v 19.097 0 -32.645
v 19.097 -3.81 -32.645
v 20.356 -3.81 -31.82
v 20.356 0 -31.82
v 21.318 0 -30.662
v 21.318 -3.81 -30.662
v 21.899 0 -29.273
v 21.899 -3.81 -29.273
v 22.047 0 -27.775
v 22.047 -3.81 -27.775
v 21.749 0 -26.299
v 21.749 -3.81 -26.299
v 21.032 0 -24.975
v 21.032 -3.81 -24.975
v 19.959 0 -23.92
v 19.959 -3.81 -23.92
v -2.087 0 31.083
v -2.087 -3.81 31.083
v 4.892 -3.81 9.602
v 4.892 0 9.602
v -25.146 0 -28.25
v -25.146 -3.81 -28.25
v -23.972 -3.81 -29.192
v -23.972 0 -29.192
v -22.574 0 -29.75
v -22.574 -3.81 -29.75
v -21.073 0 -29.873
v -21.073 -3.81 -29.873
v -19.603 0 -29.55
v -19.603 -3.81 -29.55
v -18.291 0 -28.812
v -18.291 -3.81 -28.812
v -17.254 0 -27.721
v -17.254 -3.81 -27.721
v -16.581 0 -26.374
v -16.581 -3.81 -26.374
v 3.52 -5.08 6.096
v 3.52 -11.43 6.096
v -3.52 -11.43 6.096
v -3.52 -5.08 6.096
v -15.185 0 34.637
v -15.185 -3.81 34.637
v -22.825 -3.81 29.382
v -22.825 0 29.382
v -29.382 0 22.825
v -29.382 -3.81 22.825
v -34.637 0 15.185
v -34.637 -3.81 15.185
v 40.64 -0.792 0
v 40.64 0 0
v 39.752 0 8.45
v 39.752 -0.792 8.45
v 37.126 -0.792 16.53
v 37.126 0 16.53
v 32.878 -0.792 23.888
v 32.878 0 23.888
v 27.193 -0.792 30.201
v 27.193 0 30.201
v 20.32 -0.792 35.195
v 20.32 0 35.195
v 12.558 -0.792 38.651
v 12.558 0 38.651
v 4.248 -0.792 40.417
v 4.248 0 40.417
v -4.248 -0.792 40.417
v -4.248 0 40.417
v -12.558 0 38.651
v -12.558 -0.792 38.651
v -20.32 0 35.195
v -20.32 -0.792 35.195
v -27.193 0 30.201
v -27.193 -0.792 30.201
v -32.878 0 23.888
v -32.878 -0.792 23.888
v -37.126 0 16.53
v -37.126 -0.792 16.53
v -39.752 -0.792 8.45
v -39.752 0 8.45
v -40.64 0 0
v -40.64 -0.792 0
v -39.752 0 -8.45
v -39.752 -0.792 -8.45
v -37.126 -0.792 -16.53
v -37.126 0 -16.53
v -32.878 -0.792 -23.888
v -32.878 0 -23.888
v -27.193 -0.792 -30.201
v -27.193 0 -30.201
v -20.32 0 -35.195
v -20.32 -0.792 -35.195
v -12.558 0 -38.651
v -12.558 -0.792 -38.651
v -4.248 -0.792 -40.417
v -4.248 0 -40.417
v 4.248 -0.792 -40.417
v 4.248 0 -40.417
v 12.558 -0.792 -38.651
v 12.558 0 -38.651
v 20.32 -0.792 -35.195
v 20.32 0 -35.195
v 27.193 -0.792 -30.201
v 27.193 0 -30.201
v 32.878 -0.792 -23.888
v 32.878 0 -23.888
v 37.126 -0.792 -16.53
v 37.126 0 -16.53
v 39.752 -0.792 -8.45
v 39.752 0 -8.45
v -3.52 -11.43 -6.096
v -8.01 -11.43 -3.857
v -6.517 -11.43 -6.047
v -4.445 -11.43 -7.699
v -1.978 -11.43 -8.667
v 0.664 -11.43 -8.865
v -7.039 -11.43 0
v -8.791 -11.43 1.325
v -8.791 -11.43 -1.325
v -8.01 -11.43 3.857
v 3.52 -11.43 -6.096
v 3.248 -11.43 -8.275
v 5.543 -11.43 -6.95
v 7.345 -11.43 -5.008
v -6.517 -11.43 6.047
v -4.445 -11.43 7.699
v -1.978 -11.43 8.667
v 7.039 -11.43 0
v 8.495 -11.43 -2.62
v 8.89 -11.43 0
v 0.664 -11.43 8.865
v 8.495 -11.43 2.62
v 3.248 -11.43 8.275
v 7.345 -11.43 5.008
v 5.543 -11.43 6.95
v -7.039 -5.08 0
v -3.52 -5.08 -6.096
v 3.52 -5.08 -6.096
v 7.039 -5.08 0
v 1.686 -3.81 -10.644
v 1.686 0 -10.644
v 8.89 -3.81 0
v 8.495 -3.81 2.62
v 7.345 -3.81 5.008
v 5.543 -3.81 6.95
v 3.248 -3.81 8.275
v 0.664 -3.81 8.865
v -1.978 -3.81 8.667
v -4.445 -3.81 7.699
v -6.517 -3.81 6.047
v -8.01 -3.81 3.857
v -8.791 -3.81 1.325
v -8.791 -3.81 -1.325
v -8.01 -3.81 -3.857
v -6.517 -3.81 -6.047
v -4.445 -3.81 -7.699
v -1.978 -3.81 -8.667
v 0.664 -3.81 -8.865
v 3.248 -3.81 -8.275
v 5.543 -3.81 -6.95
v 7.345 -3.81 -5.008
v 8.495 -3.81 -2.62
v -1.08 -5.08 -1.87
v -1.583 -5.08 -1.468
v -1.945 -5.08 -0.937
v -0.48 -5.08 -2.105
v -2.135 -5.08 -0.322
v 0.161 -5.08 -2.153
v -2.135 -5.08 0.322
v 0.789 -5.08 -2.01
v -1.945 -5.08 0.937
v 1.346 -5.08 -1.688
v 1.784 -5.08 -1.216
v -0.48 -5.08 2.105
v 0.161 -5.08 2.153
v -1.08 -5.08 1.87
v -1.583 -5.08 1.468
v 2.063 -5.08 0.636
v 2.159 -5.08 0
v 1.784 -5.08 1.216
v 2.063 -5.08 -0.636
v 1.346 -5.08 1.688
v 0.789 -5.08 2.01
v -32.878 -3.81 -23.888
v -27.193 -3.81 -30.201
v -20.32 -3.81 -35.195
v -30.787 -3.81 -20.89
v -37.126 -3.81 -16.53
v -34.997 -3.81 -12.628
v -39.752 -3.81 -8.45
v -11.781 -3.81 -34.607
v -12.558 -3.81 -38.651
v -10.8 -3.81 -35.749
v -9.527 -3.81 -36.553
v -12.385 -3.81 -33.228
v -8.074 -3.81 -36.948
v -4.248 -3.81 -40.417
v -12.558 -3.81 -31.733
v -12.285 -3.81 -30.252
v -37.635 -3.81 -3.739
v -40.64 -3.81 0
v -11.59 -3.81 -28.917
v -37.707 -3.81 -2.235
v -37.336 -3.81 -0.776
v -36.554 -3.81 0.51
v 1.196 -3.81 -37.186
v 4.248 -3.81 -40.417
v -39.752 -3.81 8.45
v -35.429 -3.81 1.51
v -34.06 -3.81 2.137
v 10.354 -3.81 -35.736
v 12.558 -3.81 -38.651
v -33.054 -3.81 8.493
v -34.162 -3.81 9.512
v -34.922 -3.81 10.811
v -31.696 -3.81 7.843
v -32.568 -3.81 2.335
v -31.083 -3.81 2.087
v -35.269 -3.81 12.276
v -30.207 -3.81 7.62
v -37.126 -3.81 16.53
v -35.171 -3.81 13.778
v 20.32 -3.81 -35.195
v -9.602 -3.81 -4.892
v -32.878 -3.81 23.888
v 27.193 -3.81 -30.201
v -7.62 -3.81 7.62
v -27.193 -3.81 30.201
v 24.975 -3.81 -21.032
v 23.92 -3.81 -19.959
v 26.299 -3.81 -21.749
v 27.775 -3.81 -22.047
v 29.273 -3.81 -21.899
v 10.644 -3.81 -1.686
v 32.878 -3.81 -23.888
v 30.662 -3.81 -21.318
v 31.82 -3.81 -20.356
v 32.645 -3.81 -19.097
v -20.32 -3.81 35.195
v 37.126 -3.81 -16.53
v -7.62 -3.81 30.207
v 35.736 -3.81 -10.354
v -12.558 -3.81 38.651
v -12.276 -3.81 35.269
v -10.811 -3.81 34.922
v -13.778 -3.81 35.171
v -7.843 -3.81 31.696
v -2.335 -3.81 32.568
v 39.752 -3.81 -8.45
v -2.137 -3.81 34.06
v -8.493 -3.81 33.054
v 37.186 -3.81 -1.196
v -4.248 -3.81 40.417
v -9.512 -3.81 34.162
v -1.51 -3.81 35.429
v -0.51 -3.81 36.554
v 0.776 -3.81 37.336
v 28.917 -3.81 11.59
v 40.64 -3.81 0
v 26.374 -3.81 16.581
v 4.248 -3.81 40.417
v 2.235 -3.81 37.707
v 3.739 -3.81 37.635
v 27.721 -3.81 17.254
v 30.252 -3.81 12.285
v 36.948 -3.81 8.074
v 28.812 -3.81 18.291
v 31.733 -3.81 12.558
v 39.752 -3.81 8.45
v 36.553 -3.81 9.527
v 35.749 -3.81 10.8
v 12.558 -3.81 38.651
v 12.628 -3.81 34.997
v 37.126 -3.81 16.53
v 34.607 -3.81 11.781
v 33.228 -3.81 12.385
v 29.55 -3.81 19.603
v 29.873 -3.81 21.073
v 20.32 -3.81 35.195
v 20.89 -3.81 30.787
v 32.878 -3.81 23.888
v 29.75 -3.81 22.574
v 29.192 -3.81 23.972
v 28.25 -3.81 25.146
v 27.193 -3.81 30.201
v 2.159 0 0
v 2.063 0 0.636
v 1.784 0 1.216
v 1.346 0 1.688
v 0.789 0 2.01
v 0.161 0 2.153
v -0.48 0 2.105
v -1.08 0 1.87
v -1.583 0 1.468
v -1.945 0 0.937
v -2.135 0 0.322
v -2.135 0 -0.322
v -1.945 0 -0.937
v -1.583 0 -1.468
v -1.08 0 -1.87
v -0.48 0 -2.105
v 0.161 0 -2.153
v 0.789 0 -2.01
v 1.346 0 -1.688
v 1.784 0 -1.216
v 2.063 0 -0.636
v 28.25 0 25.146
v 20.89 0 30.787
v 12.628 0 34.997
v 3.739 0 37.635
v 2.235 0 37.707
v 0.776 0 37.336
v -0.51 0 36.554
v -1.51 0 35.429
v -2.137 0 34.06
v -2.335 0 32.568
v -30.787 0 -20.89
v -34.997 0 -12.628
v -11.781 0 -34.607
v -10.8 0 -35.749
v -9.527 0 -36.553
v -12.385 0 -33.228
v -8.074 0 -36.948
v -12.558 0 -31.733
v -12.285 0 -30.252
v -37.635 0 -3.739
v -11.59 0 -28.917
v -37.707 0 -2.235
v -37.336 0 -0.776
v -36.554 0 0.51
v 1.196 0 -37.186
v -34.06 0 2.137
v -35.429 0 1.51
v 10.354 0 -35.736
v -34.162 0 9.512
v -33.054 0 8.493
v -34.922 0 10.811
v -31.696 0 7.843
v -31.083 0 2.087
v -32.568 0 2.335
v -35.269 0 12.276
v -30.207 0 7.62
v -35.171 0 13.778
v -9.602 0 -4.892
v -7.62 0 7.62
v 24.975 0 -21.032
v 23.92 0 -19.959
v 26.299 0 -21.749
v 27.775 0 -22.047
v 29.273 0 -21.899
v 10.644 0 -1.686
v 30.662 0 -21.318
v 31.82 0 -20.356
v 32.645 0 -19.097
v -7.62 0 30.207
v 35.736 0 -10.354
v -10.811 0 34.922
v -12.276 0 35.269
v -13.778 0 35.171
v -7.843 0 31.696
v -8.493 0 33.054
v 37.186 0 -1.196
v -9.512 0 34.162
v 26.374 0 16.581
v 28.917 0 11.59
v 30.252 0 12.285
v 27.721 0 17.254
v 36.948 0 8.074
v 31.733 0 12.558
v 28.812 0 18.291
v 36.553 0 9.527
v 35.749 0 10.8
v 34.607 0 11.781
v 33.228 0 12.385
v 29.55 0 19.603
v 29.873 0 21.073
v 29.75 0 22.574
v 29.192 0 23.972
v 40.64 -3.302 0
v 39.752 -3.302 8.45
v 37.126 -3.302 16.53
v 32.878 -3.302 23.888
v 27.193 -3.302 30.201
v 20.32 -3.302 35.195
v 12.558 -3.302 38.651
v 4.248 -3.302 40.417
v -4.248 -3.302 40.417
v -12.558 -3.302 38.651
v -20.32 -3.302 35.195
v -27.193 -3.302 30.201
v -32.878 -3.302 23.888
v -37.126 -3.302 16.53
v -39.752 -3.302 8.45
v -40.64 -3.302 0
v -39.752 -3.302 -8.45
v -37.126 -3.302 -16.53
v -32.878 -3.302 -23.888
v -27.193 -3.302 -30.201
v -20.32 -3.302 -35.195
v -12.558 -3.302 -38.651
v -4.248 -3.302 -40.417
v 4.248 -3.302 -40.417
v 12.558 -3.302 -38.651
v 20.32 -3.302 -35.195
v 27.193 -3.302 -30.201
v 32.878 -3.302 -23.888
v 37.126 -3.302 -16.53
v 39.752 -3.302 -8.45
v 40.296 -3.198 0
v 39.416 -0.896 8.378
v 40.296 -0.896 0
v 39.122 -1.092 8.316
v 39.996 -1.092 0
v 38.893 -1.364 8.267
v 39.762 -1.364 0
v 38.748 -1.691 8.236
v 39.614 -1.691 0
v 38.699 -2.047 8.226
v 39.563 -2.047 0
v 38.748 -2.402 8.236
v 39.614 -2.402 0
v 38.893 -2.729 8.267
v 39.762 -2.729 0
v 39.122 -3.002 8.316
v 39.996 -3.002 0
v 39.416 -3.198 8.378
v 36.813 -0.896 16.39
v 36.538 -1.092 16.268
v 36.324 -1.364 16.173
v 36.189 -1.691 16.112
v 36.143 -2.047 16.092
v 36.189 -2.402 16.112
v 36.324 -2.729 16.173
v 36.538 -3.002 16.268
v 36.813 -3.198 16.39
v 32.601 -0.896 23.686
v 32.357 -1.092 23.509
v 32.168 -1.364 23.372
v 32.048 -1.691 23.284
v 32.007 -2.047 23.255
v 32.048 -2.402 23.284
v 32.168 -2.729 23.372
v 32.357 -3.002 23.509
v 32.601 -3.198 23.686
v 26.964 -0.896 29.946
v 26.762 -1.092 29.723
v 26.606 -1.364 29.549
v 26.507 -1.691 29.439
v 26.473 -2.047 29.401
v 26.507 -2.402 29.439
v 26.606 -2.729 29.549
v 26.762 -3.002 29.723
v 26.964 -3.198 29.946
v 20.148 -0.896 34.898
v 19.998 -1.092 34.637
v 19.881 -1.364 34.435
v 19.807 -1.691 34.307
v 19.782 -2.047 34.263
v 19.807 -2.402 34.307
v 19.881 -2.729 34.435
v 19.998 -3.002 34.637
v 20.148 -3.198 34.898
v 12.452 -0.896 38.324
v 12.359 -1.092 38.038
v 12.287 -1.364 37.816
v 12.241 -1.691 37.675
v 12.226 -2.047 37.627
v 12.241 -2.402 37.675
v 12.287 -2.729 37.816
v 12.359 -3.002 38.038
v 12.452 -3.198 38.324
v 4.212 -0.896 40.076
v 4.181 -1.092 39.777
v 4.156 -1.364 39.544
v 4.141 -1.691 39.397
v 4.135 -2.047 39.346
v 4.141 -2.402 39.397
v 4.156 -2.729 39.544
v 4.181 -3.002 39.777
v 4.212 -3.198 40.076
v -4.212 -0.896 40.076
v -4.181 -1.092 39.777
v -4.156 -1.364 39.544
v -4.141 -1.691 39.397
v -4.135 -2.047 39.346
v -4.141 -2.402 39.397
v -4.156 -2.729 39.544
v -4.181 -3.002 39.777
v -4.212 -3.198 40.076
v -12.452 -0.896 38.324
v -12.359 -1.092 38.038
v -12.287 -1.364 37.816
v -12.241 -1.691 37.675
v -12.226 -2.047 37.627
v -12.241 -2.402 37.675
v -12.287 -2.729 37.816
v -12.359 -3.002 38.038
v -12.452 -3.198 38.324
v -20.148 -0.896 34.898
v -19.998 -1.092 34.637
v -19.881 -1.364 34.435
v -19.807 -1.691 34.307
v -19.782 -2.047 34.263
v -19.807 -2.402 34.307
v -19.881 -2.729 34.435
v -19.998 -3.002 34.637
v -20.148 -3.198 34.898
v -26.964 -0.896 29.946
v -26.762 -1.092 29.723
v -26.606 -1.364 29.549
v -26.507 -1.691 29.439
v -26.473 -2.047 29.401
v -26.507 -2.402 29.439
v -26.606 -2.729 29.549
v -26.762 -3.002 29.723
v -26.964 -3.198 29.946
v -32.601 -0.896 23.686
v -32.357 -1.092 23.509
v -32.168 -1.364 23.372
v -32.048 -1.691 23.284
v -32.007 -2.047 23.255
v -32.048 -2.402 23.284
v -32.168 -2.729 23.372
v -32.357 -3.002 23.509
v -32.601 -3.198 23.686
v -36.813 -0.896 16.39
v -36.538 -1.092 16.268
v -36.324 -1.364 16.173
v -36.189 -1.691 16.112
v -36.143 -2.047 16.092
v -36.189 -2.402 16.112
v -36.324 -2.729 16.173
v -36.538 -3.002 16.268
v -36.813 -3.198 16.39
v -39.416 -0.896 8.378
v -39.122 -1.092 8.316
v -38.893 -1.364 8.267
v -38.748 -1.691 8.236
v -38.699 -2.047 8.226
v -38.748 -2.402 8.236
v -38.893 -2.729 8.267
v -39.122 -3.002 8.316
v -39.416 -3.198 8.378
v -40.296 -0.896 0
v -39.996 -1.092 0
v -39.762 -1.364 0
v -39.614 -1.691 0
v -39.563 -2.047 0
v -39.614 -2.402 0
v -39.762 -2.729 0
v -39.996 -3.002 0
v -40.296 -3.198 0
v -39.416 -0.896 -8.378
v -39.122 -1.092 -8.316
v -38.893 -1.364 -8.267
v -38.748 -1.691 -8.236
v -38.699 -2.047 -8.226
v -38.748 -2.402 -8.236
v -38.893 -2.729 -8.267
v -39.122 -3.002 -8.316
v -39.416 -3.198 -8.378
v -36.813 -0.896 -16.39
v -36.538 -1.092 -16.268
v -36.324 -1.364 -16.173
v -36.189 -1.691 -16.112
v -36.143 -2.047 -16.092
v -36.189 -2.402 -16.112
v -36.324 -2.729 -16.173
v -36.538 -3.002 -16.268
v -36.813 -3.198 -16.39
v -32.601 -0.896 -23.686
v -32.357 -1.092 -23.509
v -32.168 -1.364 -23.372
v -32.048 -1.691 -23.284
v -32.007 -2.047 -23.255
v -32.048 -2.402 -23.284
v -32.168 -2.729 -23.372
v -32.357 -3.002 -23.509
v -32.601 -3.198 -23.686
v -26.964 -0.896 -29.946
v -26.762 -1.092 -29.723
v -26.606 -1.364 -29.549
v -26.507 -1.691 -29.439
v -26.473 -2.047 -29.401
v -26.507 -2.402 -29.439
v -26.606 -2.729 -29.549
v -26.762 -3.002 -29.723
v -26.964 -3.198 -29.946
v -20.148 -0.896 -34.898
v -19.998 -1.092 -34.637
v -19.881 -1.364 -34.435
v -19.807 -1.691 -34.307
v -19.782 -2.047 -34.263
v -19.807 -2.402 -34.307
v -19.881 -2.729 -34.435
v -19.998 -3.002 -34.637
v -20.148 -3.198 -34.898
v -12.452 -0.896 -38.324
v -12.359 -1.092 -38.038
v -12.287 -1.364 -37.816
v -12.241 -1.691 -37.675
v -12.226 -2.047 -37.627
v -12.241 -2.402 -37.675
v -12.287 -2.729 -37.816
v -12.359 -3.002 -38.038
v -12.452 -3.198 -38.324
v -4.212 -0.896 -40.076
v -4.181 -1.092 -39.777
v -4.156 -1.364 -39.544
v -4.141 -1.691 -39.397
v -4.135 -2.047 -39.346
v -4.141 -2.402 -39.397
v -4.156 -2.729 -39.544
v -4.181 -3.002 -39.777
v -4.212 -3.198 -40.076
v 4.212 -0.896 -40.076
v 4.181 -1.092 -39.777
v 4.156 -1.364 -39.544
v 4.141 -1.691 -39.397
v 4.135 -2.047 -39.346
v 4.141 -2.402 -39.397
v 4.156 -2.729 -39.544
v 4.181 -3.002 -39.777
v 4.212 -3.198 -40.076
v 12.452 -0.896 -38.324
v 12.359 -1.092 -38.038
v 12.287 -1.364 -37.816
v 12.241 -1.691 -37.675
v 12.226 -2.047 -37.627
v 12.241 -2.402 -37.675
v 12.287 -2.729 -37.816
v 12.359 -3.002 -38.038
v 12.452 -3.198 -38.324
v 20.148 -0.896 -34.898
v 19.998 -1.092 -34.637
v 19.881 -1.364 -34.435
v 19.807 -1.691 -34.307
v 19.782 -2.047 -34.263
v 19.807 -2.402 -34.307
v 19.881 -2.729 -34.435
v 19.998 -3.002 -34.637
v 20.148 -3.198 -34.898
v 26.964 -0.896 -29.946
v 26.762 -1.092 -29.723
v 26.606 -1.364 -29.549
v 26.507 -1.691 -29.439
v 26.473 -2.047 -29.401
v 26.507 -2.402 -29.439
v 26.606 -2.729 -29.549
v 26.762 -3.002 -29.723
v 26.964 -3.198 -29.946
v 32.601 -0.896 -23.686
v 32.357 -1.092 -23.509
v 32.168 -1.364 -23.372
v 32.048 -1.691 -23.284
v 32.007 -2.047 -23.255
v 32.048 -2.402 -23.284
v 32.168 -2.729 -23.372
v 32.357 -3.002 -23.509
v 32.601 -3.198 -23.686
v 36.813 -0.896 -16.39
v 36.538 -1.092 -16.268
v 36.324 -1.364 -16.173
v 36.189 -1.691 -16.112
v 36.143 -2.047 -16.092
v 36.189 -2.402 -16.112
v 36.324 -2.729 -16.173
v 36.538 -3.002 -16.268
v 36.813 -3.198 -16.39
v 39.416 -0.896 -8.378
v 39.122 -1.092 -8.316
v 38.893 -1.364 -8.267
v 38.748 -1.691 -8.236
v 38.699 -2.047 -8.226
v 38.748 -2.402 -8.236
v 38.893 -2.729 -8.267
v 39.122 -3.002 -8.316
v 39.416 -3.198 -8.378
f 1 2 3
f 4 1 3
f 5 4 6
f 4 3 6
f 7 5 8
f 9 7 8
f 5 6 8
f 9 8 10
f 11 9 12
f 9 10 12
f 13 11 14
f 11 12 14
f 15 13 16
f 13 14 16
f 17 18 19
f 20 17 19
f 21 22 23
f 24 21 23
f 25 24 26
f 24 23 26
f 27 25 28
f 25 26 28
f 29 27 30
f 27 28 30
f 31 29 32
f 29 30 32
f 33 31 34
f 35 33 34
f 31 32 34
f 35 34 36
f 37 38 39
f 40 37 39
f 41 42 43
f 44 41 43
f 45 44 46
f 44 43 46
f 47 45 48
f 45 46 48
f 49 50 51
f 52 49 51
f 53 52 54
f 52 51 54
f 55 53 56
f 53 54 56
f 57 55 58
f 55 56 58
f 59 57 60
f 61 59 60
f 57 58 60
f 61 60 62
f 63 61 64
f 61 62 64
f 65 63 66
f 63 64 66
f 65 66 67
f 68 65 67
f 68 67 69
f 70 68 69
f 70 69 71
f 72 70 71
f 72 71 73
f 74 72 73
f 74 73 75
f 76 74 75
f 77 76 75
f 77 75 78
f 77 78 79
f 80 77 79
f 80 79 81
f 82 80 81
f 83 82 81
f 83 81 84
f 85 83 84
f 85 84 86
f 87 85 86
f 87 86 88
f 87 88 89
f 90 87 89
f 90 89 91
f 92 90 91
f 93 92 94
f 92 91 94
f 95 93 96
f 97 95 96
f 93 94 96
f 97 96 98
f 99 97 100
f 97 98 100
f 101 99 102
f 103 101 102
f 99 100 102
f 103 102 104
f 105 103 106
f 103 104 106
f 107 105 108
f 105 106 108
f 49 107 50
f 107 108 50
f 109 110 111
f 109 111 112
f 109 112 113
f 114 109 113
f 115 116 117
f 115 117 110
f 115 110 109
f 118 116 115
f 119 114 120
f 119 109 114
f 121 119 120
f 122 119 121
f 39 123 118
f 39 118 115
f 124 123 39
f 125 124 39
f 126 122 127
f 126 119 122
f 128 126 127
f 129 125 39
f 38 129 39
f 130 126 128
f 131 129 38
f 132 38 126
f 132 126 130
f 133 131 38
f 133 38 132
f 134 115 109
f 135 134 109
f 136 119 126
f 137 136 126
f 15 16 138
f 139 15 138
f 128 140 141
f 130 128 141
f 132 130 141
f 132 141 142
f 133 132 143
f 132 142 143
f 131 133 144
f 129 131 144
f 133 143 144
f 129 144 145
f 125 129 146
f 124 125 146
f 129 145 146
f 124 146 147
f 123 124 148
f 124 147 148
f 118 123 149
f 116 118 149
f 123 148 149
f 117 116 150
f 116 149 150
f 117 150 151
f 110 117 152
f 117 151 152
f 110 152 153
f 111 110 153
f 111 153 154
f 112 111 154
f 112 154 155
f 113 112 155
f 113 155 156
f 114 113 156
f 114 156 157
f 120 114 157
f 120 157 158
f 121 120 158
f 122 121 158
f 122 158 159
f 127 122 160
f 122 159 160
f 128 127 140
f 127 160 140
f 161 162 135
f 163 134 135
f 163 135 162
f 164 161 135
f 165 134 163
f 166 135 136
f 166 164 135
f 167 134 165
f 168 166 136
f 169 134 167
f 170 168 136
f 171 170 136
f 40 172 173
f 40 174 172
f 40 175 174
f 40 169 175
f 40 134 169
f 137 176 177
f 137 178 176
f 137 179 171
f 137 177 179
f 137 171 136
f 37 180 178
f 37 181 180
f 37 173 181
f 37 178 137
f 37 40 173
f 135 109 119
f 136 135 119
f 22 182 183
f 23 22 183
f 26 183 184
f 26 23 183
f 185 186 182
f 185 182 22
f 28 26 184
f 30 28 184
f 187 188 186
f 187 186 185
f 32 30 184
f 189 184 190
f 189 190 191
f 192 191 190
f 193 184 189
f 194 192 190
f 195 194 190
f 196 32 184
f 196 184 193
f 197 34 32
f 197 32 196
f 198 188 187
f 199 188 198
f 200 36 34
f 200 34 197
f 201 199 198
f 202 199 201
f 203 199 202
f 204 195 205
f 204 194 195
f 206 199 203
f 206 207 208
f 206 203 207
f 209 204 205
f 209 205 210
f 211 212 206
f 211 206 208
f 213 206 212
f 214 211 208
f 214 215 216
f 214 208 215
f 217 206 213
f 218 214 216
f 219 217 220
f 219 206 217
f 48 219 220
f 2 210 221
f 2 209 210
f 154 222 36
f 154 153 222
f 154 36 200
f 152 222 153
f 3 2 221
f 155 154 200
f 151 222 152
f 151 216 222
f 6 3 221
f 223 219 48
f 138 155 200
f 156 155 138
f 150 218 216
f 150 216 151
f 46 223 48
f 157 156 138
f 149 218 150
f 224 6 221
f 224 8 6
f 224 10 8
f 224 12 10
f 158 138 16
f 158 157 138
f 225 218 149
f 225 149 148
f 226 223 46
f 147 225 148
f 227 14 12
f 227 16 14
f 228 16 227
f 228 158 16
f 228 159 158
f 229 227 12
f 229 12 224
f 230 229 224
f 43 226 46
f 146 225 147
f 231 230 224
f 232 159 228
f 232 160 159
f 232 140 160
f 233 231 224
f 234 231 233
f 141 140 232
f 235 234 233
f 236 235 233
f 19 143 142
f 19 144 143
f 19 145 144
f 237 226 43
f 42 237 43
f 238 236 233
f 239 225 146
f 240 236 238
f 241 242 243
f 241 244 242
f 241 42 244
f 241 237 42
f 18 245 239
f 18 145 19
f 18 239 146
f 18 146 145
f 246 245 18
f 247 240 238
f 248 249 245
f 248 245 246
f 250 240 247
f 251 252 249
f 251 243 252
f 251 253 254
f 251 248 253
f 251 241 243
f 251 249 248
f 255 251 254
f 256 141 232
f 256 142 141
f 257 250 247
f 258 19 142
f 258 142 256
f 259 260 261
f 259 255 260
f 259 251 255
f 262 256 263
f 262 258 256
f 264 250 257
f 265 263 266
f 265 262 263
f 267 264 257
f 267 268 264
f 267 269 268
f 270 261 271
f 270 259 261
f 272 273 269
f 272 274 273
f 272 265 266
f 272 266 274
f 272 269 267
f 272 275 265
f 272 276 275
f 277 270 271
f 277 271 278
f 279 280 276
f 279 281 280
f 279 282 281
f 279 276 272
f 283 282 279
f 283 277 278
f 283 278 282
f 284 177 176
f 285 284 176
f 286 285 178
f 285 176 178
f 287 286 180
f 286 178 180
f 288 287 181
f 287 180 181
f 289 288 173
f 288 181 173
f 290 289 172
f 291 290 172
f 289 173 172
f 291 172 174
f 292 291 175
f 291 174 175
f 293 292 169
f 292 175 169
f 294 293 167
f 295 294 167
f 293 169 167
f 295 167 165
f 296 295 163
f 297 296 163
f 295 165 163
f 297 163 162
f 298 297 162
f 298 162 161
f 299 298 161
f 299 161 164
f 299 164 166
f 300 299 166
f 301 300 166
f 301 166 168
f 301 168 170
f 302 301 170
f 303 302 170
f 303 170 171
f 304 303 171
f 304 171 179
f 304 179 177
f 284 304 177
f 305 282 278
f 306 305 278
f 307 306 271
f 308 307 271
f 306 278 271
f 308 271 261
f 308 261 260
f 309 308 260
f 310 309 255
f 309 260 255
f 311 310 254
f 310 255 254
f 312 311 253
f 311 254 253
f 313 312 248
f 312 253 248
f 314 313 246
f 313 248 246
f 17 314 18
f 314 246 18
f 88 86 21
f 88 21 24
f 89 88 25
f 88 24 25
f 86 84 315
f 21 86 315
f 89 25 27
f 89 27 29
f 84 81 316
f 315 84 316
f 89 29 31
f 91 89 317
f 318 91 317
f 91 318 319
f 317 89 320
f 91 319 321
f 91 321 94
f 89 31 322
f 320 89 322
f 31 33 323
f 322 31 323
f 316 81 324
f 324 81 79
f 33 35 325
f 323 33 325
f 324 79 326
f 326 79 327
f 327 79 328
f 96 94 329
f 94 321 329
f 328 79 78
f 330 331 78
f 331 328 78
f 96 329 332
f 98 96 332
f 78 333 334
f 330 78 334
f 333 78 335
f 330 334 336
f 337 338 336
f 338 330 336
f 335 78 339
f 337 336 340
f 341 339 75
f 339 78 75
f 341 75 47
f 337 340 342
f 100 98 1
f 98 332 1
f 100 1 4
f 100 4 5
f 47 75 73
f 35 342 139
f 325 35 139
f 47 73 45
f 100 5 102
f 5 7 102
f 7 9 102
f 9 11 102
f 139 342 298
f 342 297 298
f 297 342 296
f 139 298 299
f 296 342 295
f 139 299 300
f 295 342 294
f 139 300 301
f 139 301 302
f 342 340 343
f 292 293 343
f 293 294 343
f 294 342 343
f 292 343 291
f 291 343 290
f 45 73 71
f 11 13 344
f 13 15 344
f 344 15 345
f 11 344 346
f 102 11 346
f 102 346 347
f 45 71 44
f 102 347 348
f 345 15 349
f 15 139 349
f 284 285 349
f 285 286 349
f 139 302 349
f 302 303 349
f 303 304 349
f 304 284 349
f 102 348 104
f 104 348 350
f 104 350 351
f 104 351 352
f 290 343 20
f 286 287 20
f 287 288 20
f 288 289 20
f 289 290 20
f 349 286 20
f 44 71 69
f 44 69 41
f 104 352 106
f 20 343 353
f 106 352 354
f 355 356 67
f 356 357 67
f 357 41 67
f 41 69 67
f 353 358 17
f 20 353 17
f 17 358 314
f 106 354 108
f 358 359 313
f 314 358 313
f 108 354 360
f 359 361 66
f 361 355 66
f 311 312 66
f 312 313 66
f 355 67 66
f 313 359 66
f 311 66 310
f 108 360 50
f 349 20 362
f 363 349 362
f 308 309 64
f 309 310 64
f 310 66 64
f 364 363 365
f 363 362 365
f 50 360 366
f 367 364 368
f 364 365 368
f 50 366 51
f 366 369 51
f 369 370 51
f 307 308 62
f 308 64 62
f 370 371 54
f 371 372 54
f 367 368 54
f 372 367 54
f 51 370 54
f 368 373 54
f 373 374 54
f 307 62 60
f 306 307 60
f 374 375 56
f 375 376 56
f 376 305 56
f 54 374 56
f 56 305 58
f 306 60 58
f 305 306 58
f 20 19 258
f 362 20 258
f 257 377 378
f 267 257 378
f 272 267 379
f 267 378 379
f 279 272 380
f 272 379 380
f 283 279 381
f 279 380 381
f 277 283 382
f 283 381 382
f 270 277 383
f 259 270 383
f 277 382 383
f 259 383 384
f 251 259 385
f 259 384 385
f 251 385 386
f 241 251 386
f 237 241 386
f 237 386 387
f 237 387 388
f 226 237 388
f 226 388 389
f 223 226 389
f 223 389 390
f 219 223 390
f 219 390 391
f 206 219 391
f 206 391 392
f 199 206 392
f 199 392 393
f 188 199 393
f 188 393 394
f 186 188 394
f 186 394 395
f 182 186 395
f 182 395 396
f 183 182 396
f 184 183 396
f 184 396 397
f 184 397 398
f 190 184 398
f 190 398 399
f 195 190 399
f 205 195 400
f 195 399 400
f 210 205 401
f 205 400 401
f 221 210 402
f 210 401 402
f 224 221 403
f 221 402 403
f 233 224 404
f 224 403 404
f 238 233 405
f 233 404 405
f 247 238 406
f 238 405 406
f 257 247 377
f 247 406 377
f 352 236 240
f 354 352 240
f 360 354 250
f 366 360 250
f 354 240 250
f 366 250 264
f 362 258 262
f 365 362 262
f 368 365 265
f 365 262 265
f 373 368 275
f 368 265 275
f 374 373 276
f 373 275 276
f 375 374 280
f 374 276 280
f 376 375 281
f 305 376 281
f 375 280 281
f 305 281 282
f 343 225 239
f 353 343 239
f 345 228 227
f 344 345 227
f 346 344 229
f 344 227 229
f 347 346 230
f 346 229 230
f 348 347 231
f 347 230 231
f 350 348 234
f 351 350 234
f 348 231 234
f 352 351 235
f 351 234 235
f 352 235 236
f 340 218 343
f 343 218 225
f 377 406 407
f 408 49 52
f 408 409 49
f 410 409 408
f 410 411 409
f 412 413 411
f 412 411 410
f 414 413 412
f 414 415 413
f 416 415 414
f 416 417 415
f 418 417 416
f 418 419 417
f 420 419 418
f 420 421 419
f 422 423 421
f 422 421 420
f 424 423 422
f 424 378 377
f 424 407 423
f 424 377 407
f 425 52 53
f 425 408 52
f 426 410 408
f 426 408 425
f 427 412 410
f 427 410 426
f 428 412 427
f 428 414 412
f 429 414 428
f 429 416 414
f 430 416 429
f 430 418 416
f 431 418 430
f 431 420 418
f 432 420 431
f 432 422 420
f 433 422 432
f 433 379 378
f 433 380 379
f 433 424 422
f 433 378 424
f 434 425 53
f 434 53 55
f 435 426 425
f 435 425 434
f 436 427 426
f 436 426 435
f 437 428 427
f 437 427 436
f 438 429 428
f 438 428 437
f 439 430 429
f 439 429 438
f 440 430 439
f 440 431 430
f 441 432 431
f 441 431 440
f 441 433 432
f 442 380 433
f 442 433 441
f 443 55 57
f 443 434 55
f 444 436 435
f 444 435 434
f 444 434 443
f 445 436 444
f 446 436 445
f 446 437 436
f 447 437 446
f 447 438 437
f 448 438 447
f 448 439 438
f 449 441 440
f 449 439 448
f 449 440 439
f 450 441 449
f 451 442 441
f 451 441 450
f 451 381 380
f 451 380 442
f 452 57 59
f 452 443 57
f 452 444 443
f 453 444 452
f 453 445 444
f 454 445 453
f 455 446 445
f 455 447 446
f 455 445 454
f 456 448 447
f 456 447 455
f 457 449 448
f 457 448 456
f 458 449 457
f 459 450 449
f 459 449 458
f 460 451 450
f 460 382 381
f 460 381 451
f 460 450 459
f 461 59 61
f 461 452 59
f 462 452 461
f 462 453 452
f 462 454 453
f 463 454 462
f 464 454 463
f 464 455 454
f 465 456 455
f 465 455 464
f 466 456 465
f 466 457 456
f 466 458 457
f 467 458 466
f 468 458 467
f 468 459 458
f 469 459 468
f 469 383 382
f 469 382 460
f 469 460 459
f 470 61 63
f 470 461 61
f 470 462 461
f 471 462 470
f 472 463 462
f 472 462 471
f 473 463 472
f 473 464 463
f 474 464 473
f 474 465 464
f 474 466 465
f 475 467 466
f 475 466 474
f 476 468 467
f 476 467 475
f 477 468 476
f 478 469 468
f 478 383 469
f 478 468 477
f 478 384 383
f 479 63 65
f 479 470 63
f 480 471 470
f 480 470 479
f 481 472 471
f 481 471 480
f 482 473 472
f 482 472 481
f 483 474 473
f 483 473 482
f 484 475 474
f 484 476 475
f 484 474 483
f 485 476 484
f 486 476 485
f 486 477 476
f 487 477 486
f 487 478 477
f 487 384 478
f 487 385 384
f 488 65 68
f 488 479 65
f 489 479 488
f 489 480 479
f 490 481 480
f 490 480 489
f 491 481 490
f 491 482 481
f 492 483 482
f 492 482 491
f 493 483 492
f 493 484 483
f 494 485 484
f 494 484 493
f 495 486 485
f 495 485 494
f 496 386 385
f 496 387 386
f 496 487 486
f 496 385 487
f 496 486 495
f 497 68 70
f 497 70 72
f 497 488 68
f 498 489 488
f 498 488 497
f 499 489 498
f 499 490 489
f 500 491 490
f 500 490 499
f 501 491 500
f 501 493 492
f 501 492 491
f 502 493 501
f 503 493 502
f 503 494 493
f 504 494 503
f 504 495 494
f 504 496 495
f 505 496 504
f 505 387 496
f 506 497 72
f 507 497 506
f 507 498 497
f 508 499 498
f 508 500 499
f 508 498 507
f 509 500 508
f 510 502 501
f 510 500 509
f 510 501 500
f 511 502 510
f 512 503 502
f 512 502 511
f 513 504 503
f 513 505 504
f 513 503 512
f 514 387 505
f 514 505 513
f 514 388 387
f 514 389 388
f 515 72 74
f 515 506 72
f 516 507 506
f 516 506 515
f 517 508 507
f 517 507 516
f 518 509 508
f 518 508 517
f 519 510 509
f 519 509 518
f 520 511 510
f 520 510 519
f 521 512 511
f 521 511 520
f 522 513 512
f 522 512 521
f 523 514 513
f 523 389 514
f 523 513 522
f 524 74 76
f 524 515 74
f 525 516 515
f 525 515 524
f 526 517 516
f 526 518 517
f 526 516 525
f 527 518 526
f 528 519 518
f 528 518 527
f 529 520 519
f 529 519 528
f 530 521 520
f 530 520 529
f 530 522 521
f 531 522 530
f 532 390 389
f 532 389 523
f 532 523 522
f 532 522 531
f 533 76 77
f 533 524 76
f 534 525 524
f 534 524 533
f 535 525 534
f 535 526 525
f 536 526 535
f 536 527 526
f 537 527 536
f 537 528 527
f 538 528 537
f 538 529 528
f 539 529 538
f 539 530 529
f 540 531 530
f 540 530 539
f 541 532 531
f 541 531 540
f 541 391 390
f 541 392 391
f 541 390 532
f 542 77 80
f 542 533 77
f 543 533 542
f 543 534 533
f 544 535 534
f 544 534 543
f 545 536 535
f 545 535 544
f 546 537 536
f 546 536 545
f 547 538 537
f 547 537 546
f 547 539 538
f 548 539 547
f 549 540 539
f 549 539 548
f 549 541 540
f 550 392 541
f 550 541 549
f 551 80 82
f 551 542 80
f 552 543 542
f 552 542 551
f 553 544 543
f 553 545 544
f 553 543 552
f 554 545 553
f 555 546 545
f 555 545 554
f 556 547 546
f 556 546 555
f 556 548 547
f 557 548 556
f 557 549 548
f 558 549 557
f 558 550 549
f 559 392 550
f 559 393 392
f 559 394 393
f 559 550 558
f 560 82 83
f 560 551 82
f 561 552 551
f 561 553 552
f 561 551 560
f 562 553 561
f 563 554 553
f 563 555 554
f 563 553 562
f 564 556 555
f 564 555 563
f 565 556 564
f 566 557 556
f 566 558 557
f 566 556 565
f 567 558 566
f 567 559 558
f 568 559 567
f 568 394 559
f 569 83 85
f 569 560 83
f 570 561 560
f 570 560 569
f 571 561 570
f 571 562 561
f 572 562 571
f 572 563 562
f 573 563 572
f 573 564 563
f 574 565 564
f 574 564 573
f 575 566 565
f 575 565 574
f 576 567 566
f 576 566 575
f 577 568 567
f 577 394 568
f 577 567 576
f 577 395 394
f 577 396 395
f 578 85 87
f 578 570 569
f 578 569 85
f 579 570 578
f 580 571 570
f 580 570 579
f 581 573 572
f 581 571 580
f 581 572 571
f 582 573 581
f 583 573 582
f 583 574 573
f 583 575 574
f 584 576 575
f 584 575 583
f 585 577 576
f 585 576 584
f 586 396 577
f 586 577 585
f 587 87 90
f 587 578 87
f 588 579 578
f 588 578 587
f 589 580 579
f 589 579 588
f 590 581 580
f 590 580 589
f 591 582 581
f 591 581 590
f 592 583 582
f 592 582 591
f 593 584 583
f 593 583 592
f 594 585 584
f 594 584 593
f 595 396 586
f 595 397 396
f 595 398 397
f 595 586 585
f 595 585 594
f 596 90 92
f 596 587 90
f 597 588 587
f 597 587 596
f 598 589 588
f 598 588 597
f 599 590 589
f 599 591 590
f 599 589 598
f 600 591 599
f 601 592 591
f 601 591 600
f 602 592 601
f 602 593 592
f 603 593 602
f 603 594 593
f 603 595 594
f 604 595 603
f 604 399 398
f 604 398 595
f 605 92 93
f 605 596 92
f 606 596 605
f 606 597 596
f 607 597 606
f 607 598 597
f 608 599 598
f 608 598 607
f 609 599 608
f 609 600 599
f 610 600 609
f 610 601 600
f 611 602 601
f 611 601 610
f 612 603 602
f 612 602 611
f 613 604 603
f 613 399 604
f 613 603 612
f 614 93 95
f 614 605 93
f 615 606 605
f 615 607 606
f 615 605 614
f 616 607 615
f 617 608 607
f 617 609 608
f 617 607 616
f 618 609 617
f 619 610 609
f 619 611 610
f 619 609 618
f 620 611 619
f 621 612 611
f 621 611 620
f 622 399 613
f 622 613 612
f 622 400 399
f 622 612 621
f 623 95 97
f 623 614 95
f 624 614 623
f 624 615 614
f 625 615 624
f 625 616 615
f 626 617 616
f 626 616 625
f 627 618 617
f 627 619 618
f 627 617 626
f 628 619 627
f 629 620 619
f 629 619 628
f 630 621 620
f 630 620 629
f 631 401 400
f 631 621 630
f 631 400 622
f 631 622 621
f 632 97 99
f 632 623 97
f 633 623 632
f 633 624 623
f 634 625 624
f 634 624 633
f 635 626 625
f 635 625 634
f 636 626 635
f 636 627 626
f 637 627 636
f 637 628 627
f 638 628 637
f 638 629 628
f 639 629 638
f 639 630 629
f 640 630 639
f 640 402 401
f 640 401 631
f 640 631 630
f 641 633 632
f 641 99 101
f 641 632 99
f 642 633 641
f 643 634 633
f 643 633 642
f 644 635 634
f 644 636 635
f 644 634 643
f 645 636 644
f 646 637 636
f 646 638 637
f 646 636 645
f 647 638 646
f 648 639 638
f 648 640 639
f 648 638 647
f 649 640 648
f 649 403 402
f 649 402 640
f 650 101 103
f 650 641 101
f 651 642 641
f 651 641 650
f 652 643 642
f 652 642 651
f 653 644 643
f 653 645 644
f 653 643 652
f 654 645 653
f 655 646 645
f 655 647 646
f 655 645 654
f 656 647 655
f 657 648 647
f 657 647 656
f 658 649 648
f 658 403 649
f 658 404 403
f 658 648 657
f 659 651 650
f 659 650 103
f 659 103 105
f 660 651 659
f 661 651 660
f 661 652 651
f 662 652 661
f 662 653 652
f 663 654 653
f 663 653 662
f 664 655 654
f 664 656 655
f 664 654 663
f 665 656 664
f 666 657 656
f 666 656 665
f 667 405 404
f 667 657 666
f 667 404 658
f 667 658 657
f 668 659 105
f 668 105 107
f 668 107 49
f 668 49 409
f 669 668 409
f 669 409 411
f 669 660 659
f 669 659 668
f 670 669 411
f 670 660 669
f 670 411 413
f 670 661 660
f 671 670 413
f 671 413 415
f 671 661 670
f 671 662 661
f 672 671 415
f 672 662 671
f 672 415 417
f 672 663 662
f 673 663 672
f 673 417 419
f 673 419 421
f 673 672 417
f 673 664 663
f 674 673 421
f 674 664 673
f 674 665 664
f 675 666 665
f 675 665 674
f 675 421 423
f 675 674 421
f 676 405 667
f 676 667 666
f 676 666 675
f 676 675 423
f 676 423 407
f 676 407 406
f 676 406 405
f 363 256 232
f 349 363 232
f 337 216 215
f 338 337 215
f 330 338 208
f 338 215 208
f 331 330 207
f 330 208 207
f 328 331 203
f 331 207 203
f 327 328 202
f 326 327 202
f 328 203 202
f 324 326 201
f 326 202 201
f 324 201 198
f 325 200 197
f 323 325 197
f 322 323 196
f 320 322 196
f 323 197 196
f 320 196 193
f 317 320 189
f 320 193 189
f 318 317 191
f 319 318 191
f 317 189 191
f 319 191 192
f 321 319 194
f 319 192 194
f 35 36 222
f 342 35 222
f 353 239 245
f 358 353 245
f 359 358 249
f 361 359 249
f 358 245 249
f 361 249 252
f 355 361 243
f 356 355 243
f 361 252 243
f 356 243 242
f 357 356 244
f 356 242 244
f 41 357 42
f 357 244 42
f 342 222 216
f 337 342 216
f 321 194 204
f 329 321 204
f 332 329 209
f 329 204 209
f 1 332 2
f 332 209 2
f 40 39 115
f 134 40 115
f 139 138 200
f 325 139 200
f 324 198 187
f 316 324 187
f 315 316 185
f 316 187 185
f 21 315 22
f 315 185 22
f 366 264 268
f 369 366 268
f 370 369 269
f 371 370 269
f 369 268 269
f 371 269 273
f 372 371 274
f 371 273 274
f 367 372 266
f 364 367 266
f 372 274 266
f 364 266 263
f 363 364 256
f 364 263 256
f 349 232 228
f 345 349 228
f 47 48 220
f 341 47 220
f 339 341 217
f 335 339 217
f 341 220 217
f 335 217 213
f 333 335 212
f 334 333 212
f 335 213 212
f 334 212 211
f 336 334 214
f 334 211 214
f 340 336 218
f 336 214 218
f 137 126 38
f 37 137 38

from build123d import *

# Parameters (mm, degrees)
F0_R     = 40.64
F1_DEPTH = 3.81
F3_DEPTH = 25.4
F4_R     = 8.89
F5_DEPTH = 7.62
F7_DEPTH = 6.35
F8_R     = 2.159
F9_DEPTH = 25.4


with BuildPart() as f1:
    # F0 (on Front) → F1 (new body)
    with BuildSketch(Plane.XZ):
        Circle(F0_R)
    extrude(amount=F1_DEPTH)

    # F2 (on face) → F3 (cut)
    with BuildSketch(Plane.XZ.offset(3.81)):
        with BuildLine():
            Line((-30.206892, 7.62), (-7.62, 7.62))
            Line((-7.62, 7.62), (-7.62, 30.206892))
            ThreePointArc((-7.62, 30.206892), (-10.132805, 34.590488), (-15.185319, 34.637421))
            ThreePointArc((-15.185319, 34.637421), (-26.253153, 26.253153), (-34.637421, 15.185319))
            ThreePointArc((-34.637421, 15.185319), (-34.590488, 10.132805), (-30.206892, 7.62))
        make_face()
        with BuildLine():
            Line((-16.581494, -26.373752), (-9.60176, -4.892341))
            Line((-9.60176, -4.892341), (-31.083171, 2.087392))
            ThreePointArc((-31.083171, 2.087392), (-36.028718, 1.052178), (-37.634667, -3.738545))
            ThreePointArc((-37.634667, -3.738545), (-33.080903, -16.855562), (-25.145648, -28.249624))
            ThreePointArc((-25.145648, -28.249624), (-20.325919, -29.7663), (-16.581494, -26.373752))
        make_face()
        with BuildLine():
            ThreePointArc((-11.590456, -28.916813), (-12.134167, -33.940206), (-8.074184, -36.947969))
            ThreePointArc((-8.074184, -36.947969), (5.808031, -36.670464), (19.096556, -32.644547))
            ThreePointArc((19.096556, -32.644547), (22.028379, -28.52939), (19.958965, -23.919875))
            Line((19.958965, -23.919875), (1.685786, -10.643633))
            Line((1.685786, -10.643633), (-11.590456, -28.916813))
        make_face()
        with BuildLine():
            ThreePointArc((23.919875, -19.958965), (28.52939, -22.028379), (32.644547, -19.096556))
            ThreePointArc((32.644547, -19.096556), (36.670464, -5.808031), (36.947969, 8.074184))
            ThreePointArc((36.947969, 8.074184), (33.940206, 12.134167), (28.916813, 11.590456))
            Line((28.916813, 11.590456), (10.643633, -1.685786))
            Line((10.643633, -1.685786), (23.919875, -19.958965))
        make_face()
        with BuildLine():
            ThreePointArc((26.373752, 16.581494), (29.7663, 20.325919), (28.249624, 25.145648))
            ThreePointArc((28.249624, 25.145648), (16.855562, 33.080903), (3.738545, 37.634667))
            ThreePointArc((3.738545, 37.634667), (-1.052178, 36.028718), (-2.087392, 31.083171))
            Line((-2.087392, 31.083171), (4.892341, 9.60176))
            Line((4.892341, 9.60176), (26.373752, 16.581494))
        make_face()
    extrude(amount=-F3_DEPTH, mode=Mode.SUBTRACT)

    # F4 (on face) → F5 (join)
    with BuildSketch(Plane.XZ.offset(3.81)):
        Circle(F4_R)
    extrude(amount=F5_DEPTH)

    # F6 (on face) → F7 (cut)
    with BuildSketch(Plane.XZ.offset(11.43)):
        Polygon((3.519527, -6.096), (7.039054, 0), (3.519527, 6.096), (-3.519527, 6.096), (-7.039054, 0), (-3.519527, -6.096), align=None)
    extrude(amount=-F7_DEPTH, mode=Mode.SUBTRACT)

    # F8 (on face) → F9 (cut)
    with BuildSketch(Plane.XZ.offset(5.08)):
        Circle(F8_R)
    extrude(amount=-F9_DEPTH, mode=Mode.SUBTRACT)

    # F10 (on Top) → F11 (revolve, cut)
    with BuildSketch(Plane.XY):
        with BuildLine():
            Line((40.64, -3.302), (40.64, -0.791535))
            ThreePointArc((40.64, -0.791535), (39.563109, -2.046767), (40.64, -3.302))
        make_face()
    revolve(axis=Axis((0, -1.905, 0), (0, -1, 0)), mode=Mode.SUBTRACT)


solid = f1.part
